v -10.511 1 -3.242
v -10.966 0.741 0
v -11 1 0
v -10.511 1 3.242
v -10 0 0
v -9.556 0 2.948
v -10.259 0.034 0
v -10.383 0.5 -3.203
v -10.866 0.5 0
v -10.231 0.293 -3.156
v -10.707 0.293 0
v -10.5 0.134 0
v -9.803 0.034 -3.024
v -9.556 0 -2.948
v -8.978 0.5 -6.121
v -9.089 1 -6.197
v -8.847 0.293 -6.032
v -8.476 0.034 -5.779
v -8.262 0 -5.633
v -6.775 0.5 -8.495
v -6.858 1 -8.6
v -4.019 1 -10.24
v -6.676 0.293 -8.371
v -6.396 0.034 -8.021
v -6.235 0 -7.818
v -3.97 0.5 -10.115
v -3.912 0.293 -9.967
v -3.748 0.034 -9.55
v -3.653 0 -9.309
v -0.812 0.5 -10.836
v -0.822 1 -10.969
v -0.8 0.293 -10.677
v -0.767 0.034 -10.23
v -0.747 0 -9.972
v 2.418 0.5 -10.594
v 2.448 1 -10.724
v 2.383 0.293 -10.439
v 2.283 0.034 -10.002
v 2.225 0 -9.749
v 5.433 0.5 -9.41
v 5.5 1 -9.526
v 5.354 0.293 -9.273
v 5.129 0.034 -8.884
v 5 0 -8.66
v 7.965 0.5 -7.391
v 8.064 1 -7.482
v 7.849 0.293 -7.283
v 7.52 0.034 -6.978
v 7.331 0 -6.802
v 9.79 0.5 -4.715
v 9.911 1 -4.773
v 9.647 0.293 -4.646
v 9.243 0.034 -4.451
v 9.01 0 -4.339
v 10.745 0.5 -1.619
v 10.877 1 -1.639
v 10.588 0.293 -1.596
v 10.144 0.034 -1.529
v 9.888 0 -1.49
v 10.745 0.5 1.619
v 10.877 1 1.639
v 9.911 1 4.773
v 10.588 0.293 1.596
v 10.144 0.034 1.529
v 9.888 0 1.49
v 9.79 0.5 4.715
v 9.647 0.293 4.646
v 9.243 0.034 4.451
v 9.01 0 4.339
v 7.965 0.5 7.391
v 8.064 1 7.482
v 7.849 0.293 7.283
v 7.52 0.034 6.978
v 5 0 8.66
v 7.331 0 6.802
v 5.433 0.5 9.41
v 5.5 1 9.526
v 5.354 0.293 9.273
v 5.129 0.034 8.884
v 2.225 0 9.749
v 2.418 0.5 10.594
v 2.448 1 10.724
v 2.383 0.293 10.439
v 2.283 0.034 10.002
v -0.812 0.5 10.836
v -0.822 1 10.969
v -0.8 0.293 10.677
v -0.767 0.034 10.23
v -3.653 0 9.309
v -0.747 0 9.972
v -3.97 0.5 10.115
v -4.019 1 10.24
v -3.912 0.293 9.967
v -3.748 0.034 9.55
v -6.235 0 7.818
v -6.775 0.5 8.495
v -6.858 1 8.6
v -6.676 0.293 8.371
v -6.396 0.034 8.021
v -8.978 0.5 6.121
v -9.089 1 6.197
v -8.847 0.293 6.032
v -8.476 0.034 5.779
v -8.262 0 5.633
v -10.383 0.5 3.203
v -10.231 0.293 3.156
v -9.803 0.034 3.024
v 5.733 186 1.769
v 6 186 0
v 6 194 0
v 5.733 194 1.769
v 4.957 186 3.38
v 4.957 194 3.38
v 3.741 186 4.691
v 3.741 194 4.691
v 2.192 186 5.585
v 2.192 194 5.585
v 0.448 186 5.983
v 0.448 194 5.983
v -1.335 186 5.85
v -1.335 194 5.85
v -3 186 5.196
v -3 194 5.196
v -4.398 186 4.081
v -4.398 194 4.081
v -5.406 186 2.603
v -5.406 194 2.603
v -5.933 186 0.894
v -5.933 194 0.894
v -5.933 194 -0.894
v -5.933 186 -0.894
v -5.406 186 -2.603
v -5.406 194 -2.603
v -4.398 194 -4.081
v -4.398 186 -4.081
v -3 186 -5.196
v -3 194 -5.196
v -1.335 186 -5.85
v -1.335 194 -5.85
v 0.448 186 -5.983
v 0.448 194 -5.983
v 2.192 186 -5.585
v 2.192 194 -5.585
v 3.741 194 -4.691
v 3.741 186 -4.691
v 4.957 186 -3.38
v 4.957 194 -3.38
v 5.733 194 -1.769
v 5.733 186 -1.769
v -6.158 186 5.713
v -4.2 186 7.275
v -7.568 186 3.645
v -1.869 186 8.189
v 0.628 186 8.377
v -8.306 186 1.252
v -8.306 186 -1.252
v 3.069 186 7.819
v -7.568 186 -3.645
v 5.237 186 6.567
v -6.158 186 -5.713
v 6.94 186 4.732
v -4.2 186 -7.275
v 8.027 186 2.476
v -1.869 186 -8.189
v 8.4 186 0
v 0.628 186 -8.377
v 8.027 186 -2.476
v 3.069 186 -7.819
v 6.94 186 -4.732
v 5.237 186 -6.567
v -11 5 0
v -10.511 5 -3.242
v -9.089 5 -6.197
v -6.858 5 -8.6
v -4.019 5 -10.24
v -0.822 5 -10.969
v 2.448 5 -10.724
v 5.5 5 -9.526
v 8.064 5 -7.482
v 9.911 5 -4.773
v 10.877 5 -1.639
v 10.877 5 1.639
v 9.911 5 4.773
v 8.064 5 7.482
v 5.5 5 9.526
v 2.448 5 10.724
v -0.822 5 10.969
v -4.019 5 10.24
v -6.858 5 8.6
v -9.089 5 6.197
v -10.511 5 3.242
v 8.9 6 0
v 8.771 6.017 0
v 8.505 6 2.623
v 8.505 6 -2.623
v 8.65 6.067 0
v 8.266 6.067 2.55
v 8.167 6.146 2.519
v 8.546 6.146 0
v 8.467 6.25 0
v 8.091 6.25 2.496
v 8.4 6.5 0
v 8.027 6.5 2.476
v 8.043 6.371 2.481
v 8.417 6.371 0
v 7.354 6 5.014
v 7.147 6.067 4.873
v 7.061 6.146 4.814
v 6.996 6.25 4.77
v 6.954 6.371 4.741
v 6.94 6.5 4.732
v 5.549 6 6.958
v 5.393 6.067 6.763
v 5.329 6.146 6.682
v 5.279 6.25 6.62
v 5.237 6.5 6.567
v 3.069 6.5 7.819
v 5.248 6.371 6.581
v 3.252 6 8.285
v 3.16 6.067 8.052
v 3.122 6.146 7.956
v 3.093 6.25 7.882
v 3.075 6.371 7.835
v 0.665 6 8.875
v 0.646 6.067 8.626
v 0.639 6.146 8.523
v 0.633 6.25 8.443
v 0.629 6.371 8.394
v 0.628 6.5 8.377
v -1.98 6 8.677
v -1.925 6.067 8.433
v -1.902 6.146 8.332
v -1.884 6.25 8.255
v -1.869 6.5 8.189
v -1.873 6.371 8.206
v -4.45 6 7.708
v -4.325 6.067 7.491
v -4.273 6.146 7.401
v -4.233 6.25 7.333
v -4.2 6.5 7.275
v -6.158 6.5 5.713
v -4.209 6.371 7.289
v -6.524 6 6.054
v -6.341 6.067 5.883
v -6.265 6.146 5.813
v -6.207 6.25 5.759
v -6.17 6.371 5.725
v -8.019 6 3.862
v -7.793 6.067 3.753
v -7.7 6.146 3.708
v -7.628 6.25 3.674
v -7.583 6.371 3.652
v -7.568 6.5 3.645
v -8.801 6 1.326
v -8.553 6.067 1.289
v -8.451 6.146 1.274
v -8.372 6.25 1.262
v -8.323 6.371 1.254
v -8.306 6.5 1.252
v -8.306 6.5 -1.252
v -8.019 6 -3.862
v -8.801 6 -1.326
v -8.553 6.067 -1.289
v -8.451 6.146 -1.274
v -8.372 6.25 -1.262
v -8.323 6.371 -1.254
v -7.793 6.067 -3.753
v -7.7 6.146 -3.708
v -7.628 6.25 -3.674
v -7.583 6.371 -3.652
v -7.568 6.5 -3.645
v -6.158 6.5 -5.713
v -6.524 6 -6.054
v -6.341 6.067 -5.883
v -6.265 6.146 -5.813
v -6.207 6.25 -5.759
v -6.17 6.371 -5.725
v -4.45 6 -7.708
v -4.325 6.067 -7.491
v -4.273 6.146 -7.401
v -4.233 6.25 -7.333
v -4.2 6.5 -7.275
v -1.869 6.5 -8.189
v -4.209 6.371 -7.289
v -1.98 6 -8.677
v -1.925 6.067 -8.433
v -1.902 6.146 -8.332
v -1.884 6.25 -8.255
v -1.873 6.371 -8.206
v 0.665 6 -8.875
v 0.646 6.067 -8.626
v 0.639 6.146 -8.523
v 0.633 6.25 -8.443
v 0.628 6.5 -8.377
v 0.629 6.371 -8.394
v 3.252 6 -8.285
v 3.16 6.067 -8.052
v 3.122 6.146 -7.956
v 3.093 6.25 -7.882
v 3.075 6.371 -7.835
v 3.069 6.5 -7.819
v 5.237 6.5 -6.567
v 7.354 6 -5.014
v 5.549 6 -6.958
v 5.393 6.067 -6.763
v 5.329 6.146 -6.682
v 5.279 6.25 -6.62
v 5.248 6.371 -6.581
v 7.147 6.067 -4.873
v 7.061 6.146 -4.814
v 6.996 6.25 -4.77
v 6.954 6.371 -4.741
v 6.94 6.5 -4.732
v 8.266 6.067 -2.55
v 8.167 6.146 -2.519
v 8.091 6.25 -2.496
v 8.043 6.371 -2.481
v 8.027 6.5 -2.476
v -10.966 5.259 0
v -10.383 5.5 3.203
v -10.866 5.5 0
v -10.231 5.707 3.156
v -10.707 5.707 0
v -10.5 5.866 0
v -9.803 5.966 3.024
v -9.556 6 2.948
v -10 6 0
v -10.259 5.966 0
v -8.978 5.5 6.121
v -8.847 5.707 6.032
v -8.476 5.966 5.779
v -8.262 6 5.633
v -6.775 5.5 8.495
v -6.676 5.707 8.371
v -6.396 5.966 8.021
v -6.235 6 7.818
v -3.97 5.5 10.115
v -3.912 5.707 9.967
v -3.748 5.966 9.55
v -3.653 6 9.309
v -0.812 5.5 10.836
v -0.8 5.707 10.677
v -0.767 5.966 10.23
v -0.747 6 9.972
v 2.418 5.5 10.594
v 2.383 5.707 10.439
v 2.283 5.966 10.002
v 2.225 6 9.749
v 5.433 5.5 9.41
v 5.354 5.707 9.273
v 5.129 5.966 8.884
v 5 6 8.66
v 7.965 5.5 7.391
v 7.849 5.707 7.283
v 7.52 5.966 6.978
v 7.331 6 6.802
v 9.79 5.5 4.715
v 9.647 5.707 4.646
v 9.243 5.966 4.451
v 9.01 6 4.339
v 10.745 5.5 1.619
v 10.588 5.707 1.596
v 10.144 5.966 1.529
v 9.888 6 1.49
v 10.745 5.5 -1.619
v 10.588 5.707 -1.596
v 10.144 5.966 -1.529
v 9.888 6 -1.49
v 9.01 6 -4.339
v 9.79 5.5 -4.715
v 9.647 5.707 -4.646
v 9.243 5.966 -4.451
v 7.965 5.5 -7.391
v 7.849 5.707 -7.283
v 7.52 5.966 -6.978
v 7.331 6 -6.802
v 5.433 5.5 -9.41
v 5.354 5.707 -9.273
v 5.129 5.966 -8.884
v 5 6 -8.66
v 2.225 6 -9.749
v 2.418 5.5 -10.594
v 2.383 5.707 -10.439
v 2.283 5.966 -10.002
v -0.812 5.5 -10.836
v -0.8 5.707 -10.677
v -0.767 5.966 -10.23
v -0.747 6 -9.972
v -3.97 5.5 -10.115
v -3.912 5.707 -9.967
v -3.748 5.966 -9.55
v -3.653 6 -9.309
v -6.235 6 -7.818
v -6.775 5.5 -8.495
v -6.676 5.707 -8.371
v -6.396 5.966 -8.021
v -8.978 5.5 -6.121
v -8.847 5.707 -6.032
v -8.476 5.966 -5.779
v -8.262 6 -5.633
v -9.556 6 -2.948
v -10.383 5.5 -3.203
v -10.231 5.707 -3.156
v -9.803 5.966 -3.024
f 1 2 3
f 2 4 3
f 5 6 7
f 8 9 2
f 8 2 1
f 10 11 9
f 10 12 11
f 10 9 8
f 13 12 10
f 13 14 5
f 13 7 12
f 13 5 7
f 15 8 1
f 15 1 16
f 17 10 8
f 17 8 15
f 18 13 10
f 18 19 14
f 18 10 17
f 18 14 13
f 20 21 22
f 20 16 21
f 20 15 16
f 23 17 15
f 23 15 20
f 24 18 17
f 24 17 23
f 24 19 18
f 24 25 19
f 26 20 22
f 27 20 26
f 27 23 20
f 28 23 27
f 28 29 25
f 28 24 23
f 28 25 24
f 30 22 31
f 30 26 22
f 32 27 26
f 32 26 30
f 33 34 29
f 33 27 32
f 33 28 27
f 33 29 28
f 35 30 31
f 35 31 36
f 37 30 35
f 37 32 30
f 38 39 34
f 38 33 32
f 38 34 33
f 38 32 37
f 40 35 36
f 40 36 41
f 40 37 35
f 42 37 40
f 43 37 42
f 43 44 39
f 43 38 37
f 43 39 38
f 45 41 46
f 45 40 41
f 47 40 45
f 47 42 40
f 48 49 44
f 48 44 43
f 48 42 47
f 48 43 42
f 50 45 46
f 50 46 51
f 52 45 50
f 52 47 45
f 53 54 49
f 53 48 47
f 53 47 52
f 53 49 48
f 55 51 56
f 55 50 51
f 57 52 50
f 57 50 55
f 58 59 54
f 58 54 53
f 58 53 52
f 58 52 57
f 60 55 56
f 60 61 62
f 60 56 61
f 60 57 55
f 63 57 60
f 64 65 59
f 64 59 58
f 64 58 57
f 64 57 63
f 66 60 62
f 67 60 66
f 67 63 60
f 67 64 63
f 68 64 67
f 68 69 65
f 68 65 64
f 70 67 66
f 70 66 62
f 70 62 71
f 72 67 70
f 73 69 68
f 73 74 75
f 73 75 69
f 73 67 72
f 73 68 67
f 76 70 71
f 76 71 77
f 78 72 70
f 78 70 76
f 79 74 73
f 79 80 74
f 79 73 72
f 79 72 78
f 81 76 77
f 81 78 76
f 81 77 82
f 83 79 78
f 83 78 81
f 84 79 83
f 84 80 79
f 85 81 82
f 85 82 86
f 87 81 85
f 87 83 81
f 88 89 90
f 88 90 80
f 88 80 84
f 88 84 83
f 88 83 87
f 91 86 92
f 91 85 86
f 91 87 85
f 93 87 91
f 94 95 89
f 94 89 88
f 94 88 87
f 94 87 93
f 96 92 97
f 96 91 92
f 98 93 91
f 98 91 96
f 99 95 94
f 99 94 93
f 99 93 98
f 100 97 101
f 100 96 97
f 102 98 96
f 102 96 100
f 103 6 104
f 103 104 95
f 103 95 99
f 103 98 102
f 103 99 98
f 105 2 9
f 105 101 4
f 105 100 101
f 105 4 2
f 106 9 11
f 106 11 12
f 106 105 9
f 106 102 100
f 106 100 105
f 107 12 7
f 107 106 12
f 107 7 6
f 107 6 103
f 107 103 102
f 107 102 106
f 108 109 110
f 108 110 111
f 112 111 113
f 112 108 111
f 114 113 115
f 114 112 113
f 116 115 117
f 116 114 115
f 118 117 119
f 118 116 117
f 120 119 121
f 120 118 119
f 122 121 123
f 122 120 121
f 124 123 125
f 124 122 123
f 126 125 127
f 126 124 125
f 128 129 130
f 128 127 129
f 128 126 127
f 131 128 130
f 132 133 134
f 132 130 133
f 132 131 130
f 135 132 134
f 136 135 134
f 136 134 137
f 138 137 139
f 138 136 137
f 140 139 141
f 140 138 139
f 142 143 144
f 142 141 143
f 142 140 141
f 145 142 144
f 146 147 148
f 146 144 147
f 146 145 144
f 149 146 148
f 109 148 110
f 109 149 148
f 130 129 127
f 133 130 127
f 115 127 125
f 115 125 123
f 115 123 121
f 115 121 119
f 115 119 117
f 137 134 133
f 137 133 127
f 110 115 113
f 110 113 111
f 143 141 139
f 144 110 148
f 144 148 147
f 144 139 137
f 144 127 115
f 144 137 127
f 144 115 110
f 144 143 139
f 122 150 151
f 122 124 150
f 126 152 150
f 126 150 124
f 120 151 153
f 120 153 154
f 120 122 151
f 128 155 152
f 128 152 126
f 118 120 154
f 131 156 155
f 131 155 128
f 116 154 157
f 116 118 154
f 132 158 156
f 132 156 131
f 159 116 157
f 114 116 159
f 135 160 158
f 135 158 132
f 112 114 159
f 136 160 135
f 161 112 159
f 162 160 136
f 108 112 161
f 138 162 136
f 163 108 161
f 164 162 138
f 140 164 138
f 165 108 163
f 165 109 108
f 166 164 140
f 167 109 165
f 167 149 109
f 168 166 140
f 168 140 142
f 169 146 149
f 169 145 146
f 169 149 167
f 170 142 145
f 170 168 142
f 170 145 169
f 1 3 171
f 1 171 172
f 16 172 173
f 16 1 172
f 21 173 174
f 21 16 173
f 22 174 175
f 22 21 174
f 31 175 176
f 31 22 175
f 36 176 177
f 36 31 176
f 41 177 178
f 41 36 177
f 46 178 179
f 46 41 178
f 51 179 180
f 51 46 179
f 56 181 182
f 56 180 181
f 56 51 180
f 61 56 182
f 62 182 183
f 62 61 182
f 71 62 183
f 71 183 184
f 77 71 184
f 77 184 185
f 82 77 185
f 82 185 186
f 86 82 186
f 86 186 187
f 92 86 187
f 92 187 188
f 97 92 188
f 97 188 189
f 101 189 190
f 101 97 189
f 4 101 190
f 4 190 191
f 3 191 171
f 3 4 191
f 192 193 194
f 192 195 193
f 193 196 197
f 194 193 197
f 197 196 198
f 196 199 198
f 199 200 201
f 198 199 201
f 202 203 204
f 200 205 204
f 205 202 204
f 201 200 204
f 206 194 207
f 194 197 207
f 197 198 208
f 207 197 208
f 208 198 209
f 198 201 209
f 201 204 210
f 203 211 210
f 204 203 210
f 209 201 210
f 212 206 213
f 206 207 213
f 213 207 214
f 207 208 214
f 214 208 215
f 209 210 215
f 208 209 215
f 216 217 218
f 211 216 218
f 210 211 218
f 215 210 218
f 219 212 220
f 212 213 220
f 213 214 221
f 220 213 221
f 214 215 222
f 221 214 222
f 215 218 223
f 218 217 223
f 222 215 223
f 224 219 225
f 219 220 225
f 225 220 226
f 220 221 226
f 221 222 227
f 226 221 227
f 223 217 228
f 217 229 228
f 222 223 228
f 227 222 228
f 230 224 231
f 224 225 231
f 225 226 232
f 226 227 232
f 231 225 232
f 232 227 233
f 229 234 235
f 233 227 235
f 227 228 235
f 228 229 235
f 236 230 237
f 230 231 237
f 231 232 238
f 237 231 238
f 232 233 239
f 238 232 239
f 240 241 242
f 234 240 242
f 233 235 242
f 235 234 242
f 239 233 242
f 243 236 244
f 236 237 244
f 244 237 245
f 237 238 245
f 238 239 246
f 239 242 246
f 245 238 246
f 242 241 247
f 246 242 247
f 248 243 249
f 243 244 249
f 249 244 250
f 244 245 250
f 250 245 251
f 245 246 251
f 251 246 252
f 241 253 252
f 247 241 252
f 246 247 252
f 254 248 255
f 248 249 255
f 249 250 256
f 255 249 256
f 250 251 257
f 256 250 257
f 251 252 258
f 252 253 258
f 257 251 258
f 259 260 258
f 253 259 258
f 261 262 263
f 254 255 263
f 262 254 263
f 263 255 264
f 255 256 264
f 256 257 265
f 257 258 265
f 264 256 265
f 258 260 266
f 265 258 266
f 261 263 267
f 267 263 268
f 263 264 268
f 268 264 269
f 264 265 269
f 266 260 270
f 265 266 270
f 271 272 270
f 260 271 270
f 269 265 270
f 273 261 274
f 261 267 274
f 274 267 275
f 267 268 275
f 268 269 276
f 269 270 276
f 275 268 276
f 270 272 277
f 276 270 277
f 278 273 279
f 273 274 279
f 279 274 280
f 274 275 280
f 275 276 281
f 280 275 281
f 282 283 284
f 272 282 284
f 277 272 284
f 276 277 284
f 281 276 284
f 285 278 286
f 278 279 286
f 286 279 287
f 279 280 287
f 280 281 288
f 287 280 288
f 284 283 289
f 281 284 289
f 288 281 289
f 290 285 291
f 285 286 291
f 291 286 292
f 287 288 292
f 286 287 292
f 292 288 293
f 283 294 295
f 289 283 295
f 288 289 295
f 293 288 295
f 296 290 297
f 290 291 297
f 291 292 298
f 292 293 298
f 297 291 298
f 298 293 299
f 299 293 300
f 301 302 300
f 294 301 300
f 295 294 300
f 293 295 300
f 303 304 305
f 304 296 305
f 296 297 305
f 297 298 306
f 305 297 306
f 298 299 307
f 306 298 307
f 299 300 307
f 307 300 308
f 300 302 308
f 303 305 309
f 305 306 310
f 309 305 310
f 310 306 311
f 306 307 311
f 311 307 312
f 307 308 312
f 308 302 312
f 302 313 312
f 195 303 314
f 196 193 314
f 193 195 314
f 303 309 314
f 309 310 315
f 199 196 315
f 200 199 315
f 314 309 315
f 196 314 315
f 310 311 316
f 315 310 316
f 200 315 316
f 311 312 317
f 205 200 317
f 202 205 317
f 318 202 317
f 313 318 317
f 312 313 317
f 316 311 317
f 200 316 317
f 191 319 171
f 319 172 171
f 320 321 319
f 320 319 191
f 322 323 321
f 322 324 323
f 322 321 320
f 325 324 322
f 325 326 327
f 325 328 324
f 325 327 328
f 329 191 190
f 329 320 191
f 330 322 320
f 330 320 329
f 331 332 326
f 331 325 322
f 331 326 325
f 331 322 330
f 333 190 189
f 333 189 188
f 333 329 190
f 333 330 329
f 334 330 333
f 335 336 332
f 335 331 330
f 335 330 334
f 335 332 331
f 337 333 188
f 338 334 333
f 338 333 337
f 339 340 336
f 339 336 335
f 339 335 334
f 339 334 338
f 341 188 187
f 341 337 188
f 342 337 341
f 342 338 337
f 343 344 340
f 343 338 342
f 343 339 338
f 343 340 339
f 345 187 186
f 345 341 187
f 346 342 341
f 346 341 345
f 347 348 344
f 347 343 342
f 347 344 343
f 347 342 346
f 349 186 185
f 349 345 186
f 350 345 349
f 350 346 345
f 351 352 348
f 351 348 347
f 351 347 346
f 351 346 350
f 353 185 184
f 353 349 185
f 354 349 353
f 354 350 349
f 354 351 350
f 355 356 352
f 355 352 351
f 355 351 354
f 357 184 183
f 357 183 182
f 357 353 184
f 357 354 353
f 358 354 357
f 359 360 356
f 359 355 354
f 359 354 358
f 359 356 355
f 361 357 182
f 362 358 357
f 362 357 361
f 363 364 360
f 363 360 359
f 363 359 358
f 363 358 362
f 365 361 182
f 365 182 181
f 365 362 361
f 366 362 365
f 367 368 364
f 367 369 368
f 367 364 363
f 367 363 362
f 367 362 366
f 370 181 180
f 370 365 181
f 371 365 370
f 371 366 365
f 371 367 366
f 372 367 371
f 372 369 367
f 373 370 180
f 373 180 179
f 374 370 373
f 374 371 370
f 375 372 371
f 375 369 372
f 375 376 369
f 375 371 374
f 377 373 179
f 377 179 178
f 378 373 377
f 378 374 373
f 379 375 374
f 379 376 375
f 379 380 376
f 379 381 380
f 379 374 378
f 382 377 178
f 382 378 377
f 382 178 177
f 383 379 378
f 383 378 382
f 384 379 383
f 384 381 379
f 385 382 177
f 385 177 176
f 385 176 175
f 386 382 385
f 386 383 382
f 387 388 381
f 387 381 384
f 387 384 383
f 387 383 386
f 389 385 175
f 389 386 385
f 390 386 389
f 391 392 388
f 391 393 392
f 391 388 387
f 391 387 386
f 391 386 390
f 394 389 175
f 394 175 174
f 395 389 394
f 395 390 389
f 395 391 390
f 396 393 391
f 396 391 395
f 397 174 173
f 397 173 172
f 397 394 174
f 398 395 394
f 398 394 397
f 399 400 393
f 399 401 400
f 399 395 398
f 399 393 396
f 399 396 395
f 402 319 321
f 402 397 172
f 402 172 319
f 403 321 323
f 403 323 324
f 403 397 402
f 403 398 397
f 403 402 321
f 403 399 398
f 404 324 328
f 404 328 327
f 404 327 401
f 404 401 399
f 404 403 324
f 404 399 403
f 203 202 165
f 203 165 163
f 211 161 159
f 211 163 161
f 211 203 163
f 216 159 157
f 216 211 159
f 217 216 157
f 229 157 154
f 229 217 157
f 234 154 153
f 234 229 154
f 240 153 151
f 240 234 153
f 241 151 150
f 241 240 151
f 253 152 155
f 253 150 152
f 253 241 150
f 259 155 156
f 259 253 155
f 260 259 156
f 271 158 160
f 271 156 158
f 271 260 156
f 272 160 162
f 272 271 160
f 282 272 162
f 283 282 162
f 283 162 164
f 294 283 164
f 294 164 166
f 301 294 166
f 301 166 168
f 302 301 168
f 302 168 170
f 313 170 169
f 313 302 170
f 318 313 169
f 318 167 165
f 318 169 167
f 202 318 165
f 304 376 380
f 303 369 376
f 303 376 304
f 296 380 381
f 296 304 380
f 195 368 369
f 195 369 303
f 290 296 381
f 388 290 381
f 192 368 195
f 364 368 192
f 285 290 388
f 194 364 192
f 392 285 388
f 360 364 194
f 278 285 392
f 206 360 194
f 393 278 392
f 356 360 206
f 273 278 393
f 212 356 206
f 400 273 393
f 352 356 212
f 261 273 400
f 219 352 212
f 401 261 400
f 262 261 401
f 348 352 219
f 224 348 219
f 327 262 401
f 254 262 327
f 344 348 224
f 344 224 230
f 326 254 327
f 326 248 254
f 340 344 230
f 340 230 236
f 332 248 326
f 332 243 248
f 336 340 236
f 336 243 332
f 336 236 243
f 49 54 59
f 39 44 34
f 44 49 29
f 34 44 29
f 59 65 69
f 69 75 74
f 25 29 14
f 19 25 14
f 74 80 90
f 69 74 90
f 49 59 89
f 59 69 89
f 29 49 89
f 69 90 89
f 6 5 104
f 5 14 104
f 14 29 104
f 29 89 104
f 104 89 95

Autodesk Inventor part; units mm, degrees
ref_plane "YZ Plane" through (0, 0, 0) normal (1, 0, 0) x (0, 1, 0)
ref_plane "XZ Plane" through (0, 0, 0) normal (0, 1, 0) x (-1, 0, 0)
ref_plane "XY Plane" through (0, 0, 0) normal (0, 0, 1) x (1, 0, 0)
sketch "Sketch1" plane through (0, 0, 0) normal (0, 1, 0) x (-1, 0, 0)
  circle A0 centre (0, 0) radius 11
  dimension "d0" = 22
extrude "Extrusion1" add sketch "Sketch1" along normal blind 6
sketch "Sketch2" plane through (0, 6, 0) normal (0, 1, 0) x (1, 0, 0)
  circle A0 centre (0, 0) radius 8.4
  dimension "d3" = 16.8
extrude "Extrusion2" add sketch "Sketch2" along normal blind 180
sketch "Sketch3" plane through (0, 186, 0) normal (0, 1, 0) x (1, 0, 0)
  circle A0 centre (0, 0) radius 6
  dimension "d6" = 12
extrude "Extrusion3" add sketch "Sketch3" along normal blind 8
fillet "Fillet1" radius 1 2 edges at (11, 0, 0) (11, 6, 0)
fillet "Fillet2" radius 0.5 1 edges at (-8.4, 6, 0)
properties part number "1"
